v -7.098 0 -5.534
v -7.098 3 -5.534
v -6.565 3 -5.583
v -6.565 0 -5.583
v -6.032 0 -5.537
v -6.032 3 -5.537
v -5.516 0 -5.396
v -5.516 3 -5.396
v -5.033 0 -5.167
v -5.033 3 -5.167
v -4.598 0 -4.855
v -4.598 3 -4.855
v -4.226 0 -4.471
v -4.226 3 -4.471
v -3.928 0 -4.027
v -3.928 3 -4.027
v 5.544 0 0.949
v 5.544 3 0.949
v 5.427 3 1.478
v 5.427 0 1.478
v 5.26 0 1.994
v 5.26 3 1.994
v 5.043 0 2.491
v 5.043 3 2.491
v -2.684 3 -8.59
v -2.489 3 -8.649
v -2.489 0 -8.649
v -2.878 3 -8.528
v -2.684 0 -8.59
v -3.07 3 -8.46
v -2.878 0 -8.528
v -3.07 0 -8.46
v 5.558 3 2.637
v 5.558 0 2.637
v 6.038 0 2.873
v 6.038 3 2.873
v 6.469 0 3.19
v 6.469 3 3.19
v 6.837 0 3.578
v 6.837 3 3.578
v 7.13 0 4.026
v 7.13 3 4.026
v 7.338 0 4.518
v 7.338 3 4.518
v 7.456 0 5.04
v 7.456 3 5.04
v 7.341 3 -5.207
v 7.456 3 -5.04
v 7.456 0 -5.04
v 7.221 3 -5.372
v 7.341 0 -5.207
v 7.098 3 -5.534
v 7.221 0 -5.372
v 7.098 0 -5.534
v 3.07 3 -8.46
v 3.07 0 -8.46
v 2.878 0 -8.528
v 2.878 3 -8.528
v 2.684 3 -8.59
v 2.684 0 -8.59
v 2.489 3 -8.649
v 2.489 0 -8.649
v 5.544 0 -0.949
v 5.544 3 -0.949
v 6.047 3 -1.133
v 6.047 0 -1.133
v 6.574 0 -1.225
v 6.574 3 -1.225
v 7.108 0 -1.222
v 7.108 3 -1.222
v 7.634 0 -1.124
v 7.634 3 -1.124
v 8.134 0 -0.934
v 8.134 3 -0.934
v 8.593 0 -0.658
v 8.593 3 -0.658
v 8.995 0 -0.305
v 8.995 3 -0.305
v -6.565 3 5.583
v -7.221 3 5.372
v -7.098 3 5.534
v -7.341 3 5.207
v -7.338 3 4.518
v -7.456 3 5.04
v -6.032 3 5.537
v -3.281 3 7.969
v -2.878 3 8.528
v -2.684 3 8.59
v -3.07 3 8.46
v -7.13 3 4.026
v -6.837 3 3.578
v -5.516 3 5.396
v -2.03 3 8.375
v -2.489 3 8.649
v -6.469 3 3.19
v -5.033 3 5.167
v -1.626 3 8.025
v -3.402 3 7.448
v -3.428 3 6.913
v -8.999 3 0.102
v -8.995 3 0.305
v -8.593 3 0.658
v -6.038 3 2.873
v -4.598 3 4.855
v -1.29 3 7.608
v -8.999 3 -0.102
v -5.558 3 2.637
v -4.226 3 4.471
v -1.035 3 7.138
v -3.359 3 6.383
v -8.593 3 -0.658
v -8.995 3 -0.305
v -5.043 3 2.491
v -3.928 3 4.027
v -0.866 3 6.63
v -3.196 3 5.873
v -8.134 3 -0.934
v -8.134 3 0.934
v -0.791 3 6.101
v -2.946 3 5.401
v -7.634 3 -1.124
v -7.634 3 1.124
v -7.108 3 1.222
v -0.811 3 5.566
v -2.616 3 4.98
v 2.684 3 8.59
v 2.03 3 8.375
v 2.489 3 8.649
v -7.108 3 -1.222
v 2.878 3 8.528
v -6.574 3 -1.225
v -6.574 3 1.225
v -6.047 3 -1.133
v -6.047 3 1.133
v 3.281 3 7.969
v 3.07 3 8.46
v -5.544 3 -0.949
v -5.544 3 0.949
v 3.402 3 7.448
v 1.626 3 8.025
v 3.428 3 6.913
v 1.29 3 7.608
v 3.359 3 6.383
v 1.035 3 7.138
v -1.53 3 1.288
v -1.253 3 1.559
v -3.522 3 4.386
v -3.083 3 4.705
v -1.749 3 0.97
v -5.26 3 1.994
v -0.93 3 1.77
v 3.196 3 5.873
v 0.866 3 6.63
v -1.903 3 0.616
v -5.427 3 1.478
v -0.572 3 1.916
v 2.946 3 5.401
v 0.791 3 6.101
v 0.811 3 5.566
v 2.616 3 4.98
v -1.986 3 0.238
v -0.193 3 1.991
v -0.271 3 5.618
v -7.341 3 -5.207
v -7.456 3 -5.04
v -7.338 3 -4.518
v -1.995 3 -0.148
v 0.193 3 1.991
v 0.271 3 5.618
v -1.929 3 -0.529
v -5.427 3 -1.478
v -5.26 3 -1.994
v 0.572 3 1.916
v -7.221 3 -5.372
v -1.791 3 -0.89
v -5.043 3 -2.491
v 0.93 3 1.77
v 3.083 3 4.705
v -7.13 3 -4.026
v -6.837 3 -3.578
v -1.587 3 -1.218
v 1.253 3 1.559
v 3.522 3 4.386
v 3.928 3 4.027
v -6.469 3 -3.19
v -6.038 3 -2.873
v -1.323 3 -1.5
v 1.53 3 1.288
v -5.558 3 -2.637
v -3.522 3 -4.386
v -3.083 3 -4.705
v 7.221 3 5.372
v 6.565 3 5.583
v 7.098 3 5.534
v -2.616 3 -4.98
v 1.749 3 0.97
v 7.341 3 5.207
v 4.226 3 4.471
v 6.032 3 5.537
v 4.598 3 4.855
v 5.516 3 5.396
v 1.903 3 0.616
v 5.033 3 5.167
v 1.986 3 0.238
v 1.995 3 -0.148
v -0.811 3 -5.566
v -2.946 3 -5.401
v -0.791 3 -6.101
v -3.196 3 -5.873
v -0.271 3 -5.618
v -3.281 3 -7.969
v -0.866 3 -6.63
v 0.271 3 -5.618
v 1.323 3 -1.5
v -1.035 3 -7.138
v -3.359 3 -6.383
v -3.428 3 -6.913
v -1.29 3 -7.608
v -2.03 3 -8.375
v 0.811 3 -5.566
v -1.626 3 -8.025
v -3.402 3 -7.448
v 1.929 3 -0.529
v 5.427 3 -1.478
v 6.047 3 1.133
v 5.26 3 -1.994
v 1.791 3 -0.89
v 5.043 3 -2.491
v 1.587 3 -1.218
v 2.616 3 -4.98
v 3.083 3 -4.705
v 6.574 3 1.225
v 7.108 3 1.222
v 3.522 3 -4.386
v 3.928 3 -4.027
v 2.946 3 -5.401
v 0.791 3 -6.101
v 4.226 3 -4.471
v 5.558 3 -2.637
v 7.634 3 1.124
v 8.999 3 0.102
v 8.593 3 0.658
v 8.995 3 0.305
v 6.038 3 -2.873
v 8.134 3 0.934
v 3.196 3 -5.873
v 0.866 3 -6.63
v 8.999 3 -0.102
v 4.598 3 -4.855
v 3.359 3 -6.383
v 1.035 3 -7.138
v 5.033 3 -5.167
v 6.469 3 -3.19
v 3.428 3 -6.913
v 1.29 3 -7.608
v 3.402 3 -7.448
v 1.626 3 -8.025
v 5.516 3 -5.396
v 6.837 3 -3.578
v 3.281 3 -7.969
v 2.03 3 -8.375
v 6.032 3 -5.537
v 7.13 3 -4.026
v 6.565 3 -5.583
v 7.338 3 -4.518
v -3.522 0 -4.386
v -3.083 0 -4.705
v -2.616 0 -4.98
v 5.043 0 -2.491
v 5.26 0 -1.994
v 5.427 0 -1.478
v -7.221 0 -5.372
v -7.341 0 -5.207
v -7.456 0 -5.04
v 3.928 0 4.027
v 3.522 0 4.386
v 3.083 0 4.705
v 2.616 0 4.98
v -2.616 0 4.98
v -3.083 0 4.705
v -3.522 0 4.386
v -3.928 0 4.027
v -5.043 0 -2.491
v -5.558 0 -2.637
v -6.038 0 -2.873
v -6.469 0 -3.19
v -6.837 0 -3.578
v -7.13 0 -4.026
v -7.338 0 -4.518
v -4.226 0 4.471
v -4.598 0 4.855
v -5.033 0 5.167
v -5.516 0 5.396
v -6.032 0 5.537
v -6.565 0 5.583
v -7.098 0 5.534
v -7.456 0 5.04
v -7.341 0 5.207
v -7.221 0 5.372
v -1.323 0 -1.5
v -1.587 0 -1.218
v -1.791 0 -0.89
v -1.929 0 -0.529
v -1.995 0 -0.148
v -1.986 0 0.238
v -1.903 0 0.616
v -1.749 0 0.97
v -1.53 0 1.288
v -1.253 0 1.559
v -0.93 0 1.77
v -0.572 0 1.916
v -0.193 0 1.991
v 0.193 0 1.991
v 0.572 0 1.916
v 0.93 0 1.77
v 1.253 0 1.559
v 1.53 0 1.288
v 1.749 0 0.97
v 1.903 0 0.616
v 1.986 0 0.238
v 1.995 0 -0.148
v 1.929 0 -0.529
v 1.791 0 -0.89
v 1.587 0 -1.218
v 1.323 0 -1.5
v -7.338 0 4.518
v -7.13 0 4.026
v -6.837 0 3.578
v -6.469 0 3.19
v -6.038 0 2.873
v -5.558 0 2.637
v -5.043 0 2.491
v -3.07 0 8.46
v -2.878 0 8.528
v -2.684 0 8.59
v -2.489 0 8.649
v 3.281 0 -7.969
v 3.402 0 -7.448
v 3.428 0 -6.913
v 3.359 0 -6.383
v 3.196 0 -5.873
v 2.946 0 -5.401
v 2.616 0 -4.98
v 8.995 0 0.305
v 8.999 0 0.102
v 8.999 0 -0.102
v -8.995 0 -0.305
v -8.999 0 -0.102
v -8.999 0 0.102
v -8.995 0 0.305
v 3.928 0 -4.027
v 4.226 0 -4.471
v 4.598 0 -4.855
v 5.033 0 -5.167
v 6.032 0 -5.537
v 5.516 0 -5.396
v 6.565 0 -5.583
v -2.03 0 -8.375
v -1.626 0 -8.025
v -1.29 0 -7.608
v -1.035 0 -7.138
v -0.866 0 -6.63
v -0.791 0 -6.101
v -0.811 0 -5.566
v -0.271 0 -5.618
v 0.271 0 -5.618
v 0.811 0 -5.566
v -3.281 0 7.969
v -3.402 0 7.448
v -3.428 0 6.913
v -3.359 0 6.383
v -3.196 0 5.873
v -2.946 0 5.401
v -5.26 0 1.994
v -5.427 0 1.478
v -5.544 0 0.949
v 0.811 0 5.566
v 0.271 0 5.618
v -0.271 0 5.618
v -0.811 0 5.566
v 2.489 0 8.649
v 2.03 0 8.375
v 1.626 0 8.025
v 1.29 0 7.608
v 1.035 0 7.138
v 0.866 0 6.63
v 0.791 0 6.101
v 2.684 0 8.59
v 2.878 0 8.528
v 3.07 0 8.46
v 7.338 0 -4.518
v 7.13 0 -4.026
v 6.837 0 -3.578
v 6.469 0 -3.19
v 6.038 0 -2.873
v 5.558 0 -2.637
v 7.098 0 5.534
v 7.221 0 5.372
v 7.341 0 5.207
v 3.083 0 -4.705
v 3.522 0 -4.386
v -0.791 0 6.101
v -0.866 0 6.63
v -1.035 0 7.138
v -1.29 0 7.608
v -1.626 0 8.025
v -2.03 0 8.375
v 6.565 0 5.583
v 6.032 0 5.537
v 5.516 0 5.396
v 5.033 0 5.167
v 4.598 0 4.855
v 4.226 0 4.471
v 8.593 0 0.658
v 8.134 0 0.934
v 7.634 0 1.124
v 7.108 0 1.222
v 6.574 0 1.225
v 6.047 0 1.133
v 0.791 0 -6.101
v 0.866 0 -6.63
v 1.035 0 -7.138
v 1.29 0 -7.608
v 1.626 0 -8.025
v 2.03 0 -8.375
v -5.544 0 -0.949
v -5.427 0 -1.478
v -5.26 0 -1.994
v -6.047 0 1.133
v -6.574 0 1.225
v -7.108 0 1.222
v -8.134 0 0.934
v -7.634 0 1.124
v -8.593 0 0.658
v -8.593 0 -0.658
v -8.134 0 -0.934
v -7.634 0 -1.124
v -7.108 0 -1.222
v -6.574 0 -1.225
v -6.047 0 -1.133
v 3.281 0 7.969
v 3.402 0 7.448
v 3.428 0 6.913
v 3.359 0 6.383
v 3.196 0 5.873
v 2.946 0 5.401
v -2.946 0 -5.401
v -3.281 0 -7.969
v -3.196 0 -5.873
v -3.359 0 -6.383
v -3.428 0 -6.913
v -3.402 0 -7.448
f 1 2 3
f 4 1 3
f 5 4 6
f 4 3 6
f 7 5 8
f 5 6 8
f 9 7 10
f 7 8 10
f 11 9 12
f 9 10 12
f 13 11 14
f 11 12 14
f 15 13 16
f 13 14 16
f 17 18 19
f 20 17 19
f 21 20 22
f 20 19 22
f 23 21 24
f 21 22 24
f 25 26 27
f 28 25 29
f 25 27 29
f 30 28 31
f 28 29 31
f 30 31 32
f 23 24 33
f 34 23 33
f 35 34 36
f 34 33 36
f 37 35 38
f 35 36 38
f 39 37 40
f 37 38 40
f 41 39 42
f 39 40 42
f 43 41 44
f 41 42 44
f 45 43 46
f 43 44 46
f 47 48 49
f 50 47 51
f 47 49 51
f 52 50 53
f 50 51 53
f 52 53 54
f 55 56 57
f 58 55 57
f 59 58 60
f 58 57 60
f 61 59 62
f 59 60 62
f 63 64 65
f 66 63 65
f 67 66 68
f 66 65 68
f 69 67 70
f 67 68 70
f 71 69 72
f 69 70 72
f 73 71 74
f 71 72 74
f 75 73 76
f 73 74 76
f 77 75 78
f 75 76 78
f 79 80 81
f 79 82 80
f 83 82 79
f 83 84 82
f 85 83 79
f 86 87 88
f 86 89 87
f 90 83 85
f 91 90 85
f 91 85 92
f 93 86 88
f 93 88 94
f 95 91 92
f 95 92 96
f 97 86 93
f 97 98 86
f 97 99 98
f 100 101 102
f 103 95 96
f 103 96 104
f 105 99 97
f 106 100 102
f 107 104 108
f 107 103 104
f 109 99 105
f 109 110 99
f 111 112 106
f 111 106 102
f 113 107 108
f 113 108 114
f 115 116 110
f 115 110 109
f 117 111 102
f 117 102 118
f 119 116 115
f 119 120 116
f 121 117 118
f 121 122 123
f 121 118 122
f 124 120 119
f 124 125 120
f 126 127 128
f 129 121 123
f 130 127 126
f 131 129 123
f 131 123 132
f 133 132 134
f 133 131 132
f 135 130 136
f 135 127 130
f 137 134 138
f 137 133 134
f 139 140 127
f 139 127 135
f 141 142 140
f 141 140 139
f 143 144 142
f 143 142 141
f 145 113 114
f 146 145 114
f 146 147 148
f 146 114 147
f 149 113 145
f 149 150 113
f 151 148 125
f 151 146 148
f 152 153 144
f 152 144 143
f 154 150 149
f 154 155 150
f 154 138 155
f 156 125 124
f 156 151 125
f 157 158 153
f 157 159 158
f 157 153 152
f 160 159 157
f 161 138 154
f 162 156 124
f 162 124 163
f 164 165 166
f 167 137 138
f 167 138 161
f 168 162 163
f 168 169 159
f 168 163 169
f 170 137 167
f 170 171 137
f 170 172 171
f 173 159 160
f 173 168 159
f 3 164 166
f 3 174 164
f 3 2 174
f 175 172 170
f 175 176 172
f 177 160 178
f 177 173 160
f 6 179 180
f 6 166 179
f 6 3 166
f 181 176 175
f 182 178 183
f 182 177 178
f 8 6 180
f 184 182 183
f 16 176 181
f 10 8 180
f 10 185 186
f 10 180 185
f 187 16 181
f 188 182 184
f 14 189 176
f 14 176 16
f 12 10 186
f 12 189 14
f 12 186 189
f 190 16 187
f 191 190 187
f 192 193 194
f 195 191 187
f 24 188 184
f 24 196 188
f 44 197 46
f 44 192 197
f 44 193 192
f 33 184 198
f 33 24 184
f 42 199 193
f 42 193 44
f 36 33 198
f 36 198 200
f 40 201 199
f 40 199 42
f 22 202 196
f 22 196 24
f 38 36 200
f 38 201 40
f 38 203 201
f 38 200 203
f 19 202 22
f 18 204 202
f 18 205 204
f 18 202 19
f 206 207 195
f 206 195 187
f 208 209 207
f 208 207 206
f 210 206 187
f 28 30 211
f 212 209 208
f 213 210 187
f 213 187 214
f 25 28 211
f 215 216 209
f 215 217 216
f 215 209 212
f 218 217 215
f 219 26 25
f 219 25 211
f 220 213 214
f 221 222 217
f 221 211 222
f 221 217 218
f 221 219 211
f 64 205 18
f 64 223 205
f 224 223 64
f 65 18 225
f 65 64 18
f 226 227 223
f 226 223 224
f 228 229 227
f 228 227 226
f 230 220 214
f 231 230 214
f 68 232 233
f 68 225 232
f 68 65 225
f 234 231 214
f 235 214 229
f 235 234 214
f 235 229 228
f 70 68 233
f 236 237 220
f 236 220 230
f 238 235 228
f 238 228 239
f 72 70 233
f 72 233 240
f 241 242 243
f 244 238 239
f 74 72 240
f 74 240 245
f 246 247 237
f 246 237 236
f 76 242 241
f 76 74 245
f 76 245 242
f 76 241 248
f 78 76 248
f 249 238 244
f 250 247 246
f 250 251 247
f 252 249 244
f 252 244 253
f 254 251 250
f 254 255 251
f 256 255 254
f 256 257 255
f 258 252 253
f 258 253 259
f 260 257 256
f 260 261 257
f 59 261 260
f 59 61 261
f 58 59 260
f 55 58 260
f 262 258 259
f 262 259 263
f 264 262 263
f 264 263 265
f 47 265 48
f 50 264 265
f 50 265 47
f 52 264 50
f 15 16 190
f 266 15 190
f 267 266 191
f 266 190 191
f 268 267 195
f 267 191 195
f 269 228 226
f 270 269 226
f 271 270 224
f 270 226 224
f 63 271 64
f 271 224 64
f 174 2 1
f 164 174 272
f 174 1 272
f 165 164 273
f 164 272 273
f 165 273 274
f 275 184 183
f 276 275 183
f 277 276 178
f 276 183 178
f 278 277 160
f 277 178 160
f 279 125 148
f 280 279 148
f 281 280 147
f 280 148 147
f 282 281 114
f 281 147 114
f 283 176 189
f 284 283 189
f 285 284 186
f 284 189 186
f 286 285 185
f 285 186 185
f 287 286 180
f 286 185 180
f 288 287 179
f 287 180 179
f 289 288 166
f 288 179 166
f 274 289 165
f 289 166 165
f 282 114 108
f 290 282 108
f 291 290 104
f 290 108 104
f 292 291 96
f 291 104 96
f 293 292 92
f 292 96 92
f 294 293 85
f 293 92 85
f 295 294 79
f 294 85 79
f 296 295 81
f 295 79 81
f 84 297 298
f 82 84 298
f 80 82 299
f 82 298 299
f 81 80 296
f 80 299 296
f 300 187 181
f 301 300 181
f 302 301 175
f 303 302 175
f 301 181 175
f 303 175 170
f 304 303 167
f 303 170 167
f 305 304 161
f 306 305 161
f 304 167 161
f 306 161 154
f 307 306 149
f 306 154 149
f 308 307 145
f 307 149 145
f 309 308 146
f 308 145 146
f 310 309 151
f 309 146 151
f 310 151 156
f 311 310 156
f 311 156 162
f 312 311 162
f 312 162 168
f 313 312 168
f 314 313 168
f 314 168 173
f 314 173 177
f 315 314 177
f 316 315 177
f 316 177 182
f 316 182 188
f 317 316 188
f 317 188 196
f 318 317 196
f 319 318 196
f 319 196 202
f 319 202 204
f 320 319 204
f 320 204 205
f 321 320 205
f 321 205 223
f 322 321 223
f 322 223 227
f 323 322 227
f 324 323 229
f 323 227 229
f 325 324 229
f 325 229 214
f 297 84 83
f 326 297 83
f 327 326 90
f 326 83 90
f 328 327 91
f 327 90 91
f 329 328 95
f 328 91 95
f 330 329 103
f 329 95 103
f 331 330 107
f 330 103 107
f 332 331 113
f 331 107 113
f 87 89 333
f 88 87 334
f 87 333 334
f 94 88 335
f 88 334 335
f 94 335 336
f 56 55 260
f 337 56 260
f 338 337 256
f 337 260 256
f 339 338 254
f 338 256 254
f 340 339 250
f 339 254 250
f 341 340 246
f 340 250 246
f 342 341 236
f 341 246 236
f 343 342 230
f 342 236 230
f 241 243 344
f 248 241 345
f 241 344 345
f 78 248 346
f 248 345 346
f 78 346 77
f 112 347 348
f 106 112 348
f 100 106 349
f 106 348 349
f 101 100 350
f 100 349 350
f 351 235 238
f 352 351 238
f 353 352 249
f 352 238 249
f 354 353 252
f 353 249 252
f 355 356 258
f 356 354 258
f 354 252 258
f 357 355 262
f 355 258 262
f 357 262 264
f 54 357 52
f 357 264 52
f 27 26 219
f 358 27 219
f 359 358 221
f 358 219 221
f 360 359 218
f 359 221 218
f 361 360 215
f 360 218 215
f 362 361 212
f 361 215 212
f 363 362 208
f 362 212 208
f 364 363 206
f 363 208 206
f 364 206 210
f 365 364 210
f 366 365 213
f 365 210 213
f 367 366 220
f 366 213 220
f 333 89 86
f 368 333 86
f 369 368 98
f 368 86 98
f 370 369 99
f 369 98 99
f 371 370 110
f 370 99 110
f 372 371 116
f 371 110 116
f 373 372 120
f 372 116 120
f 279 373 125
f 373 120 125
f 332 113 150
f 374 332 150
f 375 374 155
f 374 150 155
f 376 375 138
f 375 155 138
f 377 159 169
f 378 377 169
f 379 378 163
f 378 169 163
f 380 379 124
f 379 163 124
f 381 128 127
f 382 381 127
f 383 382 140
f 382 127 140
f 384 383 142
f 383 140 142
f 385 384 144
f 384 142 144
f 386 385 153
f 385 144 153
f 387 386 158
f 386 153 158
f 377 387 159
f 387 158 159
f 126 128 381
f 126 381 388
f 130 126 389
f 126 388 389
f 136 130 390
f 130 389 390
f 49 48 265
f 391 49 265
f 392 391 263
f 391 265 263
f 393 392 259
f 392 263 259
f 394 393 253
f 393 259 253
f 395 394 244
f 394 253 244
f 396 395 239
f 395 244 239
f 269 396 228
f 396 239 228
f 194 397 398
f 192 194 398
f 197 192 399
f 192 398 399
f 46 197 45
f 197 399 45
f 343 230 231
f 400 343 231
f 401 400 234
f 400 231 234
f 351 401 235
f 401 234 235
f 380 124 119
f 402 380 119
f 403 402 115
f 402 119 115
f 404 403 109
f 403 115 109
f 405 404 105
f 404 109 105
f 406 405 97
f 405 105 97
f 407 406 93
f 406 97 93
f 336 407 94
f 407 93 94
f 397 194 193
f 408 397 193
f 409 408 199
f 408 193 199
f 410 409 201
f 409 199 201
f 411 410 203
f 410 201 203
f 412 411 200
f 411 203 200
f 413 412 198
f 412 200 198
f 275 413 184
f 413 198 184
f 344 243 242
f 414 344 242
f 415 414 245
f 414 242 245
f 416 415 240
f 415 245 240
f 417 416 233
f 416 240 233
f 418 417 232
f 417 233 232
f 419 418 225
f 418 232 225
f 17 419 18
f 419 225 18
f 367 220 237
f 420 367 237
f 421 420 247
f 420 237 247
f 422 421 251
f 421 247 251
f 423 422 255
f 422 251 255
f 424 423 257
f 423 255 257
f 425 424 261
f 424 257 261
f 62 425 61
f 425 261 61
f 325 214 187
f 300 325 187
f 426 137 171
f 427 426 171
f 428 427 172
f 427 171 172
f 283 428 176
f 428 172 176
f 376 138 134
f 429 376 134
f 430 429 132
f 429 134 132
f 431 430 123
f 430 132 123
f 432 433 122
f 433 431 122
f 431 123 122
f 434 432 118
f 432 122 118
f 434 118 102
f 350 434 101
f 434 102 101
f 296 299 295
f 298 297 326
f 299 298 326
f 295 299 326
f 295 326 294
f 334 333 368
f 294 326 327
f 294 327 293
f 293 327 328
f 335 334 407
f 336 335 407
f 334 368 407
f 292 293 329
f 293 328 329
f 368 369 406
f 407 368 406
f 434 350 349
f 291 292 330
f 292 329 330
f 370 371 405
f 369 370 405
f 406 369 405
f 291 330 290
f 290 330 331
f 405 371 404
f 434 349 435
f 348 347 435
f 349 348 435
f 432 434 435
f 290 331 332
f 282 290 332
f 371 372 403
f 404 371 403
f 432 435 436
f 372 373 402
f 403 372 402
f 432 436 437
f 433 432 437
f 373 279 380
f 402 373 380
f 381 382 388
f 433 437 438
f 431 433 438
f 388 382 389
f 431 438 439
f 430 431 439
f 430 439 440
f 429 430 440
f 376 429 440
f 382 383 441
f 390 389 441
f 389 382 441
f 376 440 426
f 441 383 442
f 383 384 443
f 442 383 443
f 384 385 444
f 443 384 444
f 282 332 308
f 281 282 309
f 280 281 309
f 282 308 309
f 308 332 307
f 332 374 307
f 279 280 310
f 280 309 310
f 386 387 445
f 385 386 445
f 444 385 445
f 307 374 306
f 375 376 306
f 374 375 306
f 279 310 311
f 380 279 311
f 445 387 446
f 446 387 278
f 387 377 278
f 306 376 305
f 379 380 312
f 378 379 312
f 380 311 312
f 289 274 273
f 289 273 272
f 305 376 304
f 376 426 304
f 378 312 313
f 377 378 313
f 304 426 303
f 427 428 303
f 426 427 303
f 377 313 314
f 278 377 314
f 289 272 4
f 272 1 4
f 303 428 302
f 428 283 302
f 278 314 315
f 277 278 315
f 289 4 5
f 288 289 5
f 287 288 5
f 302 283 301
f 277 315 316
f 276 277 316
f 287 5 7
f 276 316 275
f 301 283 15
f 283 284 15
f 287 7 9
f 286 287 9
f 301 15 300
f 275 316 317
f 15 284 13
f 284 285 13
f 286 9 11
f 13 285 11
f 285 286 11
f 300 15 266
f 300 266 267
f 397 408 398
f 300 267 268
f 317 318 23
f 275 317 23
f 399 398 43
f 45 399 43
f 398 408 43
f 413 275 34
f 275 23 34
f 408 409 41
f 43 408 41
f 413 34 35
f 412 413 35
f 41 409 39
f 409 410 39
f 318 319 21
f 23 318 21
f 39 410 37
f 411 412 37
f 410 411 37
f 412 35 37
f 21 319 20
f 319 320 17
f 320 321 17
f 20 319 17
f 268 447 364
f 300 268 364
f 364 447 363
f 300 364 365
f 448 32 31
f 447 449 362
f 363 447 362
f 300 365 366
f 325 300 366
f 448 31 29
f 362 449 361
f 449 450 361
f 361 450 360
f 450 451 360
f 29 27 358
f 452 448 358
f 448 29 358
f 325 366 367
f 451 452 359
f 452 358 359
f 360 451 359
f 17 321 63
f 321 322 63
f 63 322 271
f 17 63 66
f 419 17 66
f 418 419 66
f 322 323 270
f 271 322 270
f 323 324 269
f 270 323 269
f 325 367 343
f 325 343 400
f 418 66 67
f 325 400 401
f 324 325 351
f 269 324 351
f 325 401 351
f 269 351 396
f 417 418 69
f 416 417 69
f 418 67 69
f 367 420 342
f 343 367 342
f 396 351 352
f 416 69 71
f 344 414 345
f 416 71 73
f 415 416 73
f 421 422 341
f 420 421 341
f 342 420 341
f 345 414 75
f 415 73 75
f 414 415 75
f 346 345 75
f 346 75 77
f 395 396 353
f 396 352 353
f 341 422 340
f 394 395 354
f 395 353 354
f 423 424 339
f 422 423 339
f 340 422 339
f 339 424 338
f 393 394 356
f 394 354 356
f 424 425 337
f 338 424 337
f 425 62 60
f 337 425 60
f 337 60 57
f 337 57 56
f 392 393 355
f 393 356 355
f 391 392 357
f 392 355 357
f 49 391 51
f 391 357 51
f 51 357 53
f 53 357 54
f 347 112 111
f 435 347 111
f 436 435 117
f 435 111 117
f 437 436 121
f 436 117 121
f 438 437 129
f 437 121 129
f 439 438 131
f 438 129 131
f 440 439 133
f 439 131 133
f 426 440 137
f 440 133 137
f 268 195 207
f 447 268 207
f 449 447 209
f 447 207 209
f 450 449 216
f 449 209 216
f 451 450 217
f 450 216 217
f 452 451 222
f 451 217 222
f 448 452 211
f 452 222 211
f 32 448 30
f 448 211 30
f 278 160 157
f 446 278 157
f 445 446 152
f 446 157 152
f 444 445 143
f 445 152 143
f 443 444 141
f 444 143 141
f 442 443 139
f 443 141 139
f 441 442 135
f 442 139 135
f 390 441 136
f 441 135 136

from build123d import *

# Parameters (mm, degrees)
SKETCH1_R           = 9
BOSS_EXTRUDE1_DEPTH = 3
CUT_EXTRUDE1_DEPTH  = 4
CIRPATTERN1_COUNT   = 10
CUT_EXTRUDE5_DEPTH  = 4


with BuildPart() as part:
    # Sketch1 → Boss-Extrude1 (new body)
    with BuildSketch(Plane(origin=(0, 0, 0), x_dir=(1, 0, 0), z_dir=(0, 1, 0))):
        Circle(SKETCH1_R)
    extrude(amount=BOSS_EXTRUDE1_DEPTH)

    # Sketch2 → Cut-Extrude1 (cut, through all)
    with BuildSketch(Plane(origin=(0, 3, 0), x_dir=(1, 0, 0), z_dir=(0, 1, 0))):
        with BuildLine():
            ThreePointArc((-0.810569881, 5.566291536), (0, 5.625), (0.810569881, 5.566291536))
            ThreePointArc((0.810569881, 5.566291536), (1.152028564, 7.378729724), (2.489254397, 8.648908171))
            ThreePointArc((2.489254397, 8.648908171), (0, 9), (-2.489254397, 8.648908171))
            ThreePointArc((-2.489254397, 8.648908171), (-1.152028564, 7.378729724), (-0.810569881, 5.566291536))
        make_face()
    cut_extrude1 = extrude(amount=-CUT_EXTRUDE1_DEPTH, mode=Mode.SUBTRACT)

    # CirPattern1: Cut-Extrude1 ×10 about axis
    cirpattern1_axis = Axis((0, 0, 0), (0, 1, 0))
    for i in range(1, CIRPATTERN1_COUNT):
        add(cut_extrude1.rotate(cirpattern1_axis, i * 360 / CIRPATTERN1_COUNT), mode=Mode.SUBTRACT)

    # Sketch6 → Cut-Extrude5 (cut, through all)
    with BuildSketch(Plane(origin=(0, 3, 0), x_dir=(1, 0, 0), z_dir=(0, 1, 0))):
        with BuildLine():
            Line((1.322875656, 1.5), (-1.322875656, 1.5))
            ThreePointArc((-1.322875656, 1.5), (0, -2), (1.322875656, 1.5))
        make_face()
    extrude(amount=-CUT_EXTRUDE5_DEPTH, mode=Mode.SUBTRACT)


solid = part.part
